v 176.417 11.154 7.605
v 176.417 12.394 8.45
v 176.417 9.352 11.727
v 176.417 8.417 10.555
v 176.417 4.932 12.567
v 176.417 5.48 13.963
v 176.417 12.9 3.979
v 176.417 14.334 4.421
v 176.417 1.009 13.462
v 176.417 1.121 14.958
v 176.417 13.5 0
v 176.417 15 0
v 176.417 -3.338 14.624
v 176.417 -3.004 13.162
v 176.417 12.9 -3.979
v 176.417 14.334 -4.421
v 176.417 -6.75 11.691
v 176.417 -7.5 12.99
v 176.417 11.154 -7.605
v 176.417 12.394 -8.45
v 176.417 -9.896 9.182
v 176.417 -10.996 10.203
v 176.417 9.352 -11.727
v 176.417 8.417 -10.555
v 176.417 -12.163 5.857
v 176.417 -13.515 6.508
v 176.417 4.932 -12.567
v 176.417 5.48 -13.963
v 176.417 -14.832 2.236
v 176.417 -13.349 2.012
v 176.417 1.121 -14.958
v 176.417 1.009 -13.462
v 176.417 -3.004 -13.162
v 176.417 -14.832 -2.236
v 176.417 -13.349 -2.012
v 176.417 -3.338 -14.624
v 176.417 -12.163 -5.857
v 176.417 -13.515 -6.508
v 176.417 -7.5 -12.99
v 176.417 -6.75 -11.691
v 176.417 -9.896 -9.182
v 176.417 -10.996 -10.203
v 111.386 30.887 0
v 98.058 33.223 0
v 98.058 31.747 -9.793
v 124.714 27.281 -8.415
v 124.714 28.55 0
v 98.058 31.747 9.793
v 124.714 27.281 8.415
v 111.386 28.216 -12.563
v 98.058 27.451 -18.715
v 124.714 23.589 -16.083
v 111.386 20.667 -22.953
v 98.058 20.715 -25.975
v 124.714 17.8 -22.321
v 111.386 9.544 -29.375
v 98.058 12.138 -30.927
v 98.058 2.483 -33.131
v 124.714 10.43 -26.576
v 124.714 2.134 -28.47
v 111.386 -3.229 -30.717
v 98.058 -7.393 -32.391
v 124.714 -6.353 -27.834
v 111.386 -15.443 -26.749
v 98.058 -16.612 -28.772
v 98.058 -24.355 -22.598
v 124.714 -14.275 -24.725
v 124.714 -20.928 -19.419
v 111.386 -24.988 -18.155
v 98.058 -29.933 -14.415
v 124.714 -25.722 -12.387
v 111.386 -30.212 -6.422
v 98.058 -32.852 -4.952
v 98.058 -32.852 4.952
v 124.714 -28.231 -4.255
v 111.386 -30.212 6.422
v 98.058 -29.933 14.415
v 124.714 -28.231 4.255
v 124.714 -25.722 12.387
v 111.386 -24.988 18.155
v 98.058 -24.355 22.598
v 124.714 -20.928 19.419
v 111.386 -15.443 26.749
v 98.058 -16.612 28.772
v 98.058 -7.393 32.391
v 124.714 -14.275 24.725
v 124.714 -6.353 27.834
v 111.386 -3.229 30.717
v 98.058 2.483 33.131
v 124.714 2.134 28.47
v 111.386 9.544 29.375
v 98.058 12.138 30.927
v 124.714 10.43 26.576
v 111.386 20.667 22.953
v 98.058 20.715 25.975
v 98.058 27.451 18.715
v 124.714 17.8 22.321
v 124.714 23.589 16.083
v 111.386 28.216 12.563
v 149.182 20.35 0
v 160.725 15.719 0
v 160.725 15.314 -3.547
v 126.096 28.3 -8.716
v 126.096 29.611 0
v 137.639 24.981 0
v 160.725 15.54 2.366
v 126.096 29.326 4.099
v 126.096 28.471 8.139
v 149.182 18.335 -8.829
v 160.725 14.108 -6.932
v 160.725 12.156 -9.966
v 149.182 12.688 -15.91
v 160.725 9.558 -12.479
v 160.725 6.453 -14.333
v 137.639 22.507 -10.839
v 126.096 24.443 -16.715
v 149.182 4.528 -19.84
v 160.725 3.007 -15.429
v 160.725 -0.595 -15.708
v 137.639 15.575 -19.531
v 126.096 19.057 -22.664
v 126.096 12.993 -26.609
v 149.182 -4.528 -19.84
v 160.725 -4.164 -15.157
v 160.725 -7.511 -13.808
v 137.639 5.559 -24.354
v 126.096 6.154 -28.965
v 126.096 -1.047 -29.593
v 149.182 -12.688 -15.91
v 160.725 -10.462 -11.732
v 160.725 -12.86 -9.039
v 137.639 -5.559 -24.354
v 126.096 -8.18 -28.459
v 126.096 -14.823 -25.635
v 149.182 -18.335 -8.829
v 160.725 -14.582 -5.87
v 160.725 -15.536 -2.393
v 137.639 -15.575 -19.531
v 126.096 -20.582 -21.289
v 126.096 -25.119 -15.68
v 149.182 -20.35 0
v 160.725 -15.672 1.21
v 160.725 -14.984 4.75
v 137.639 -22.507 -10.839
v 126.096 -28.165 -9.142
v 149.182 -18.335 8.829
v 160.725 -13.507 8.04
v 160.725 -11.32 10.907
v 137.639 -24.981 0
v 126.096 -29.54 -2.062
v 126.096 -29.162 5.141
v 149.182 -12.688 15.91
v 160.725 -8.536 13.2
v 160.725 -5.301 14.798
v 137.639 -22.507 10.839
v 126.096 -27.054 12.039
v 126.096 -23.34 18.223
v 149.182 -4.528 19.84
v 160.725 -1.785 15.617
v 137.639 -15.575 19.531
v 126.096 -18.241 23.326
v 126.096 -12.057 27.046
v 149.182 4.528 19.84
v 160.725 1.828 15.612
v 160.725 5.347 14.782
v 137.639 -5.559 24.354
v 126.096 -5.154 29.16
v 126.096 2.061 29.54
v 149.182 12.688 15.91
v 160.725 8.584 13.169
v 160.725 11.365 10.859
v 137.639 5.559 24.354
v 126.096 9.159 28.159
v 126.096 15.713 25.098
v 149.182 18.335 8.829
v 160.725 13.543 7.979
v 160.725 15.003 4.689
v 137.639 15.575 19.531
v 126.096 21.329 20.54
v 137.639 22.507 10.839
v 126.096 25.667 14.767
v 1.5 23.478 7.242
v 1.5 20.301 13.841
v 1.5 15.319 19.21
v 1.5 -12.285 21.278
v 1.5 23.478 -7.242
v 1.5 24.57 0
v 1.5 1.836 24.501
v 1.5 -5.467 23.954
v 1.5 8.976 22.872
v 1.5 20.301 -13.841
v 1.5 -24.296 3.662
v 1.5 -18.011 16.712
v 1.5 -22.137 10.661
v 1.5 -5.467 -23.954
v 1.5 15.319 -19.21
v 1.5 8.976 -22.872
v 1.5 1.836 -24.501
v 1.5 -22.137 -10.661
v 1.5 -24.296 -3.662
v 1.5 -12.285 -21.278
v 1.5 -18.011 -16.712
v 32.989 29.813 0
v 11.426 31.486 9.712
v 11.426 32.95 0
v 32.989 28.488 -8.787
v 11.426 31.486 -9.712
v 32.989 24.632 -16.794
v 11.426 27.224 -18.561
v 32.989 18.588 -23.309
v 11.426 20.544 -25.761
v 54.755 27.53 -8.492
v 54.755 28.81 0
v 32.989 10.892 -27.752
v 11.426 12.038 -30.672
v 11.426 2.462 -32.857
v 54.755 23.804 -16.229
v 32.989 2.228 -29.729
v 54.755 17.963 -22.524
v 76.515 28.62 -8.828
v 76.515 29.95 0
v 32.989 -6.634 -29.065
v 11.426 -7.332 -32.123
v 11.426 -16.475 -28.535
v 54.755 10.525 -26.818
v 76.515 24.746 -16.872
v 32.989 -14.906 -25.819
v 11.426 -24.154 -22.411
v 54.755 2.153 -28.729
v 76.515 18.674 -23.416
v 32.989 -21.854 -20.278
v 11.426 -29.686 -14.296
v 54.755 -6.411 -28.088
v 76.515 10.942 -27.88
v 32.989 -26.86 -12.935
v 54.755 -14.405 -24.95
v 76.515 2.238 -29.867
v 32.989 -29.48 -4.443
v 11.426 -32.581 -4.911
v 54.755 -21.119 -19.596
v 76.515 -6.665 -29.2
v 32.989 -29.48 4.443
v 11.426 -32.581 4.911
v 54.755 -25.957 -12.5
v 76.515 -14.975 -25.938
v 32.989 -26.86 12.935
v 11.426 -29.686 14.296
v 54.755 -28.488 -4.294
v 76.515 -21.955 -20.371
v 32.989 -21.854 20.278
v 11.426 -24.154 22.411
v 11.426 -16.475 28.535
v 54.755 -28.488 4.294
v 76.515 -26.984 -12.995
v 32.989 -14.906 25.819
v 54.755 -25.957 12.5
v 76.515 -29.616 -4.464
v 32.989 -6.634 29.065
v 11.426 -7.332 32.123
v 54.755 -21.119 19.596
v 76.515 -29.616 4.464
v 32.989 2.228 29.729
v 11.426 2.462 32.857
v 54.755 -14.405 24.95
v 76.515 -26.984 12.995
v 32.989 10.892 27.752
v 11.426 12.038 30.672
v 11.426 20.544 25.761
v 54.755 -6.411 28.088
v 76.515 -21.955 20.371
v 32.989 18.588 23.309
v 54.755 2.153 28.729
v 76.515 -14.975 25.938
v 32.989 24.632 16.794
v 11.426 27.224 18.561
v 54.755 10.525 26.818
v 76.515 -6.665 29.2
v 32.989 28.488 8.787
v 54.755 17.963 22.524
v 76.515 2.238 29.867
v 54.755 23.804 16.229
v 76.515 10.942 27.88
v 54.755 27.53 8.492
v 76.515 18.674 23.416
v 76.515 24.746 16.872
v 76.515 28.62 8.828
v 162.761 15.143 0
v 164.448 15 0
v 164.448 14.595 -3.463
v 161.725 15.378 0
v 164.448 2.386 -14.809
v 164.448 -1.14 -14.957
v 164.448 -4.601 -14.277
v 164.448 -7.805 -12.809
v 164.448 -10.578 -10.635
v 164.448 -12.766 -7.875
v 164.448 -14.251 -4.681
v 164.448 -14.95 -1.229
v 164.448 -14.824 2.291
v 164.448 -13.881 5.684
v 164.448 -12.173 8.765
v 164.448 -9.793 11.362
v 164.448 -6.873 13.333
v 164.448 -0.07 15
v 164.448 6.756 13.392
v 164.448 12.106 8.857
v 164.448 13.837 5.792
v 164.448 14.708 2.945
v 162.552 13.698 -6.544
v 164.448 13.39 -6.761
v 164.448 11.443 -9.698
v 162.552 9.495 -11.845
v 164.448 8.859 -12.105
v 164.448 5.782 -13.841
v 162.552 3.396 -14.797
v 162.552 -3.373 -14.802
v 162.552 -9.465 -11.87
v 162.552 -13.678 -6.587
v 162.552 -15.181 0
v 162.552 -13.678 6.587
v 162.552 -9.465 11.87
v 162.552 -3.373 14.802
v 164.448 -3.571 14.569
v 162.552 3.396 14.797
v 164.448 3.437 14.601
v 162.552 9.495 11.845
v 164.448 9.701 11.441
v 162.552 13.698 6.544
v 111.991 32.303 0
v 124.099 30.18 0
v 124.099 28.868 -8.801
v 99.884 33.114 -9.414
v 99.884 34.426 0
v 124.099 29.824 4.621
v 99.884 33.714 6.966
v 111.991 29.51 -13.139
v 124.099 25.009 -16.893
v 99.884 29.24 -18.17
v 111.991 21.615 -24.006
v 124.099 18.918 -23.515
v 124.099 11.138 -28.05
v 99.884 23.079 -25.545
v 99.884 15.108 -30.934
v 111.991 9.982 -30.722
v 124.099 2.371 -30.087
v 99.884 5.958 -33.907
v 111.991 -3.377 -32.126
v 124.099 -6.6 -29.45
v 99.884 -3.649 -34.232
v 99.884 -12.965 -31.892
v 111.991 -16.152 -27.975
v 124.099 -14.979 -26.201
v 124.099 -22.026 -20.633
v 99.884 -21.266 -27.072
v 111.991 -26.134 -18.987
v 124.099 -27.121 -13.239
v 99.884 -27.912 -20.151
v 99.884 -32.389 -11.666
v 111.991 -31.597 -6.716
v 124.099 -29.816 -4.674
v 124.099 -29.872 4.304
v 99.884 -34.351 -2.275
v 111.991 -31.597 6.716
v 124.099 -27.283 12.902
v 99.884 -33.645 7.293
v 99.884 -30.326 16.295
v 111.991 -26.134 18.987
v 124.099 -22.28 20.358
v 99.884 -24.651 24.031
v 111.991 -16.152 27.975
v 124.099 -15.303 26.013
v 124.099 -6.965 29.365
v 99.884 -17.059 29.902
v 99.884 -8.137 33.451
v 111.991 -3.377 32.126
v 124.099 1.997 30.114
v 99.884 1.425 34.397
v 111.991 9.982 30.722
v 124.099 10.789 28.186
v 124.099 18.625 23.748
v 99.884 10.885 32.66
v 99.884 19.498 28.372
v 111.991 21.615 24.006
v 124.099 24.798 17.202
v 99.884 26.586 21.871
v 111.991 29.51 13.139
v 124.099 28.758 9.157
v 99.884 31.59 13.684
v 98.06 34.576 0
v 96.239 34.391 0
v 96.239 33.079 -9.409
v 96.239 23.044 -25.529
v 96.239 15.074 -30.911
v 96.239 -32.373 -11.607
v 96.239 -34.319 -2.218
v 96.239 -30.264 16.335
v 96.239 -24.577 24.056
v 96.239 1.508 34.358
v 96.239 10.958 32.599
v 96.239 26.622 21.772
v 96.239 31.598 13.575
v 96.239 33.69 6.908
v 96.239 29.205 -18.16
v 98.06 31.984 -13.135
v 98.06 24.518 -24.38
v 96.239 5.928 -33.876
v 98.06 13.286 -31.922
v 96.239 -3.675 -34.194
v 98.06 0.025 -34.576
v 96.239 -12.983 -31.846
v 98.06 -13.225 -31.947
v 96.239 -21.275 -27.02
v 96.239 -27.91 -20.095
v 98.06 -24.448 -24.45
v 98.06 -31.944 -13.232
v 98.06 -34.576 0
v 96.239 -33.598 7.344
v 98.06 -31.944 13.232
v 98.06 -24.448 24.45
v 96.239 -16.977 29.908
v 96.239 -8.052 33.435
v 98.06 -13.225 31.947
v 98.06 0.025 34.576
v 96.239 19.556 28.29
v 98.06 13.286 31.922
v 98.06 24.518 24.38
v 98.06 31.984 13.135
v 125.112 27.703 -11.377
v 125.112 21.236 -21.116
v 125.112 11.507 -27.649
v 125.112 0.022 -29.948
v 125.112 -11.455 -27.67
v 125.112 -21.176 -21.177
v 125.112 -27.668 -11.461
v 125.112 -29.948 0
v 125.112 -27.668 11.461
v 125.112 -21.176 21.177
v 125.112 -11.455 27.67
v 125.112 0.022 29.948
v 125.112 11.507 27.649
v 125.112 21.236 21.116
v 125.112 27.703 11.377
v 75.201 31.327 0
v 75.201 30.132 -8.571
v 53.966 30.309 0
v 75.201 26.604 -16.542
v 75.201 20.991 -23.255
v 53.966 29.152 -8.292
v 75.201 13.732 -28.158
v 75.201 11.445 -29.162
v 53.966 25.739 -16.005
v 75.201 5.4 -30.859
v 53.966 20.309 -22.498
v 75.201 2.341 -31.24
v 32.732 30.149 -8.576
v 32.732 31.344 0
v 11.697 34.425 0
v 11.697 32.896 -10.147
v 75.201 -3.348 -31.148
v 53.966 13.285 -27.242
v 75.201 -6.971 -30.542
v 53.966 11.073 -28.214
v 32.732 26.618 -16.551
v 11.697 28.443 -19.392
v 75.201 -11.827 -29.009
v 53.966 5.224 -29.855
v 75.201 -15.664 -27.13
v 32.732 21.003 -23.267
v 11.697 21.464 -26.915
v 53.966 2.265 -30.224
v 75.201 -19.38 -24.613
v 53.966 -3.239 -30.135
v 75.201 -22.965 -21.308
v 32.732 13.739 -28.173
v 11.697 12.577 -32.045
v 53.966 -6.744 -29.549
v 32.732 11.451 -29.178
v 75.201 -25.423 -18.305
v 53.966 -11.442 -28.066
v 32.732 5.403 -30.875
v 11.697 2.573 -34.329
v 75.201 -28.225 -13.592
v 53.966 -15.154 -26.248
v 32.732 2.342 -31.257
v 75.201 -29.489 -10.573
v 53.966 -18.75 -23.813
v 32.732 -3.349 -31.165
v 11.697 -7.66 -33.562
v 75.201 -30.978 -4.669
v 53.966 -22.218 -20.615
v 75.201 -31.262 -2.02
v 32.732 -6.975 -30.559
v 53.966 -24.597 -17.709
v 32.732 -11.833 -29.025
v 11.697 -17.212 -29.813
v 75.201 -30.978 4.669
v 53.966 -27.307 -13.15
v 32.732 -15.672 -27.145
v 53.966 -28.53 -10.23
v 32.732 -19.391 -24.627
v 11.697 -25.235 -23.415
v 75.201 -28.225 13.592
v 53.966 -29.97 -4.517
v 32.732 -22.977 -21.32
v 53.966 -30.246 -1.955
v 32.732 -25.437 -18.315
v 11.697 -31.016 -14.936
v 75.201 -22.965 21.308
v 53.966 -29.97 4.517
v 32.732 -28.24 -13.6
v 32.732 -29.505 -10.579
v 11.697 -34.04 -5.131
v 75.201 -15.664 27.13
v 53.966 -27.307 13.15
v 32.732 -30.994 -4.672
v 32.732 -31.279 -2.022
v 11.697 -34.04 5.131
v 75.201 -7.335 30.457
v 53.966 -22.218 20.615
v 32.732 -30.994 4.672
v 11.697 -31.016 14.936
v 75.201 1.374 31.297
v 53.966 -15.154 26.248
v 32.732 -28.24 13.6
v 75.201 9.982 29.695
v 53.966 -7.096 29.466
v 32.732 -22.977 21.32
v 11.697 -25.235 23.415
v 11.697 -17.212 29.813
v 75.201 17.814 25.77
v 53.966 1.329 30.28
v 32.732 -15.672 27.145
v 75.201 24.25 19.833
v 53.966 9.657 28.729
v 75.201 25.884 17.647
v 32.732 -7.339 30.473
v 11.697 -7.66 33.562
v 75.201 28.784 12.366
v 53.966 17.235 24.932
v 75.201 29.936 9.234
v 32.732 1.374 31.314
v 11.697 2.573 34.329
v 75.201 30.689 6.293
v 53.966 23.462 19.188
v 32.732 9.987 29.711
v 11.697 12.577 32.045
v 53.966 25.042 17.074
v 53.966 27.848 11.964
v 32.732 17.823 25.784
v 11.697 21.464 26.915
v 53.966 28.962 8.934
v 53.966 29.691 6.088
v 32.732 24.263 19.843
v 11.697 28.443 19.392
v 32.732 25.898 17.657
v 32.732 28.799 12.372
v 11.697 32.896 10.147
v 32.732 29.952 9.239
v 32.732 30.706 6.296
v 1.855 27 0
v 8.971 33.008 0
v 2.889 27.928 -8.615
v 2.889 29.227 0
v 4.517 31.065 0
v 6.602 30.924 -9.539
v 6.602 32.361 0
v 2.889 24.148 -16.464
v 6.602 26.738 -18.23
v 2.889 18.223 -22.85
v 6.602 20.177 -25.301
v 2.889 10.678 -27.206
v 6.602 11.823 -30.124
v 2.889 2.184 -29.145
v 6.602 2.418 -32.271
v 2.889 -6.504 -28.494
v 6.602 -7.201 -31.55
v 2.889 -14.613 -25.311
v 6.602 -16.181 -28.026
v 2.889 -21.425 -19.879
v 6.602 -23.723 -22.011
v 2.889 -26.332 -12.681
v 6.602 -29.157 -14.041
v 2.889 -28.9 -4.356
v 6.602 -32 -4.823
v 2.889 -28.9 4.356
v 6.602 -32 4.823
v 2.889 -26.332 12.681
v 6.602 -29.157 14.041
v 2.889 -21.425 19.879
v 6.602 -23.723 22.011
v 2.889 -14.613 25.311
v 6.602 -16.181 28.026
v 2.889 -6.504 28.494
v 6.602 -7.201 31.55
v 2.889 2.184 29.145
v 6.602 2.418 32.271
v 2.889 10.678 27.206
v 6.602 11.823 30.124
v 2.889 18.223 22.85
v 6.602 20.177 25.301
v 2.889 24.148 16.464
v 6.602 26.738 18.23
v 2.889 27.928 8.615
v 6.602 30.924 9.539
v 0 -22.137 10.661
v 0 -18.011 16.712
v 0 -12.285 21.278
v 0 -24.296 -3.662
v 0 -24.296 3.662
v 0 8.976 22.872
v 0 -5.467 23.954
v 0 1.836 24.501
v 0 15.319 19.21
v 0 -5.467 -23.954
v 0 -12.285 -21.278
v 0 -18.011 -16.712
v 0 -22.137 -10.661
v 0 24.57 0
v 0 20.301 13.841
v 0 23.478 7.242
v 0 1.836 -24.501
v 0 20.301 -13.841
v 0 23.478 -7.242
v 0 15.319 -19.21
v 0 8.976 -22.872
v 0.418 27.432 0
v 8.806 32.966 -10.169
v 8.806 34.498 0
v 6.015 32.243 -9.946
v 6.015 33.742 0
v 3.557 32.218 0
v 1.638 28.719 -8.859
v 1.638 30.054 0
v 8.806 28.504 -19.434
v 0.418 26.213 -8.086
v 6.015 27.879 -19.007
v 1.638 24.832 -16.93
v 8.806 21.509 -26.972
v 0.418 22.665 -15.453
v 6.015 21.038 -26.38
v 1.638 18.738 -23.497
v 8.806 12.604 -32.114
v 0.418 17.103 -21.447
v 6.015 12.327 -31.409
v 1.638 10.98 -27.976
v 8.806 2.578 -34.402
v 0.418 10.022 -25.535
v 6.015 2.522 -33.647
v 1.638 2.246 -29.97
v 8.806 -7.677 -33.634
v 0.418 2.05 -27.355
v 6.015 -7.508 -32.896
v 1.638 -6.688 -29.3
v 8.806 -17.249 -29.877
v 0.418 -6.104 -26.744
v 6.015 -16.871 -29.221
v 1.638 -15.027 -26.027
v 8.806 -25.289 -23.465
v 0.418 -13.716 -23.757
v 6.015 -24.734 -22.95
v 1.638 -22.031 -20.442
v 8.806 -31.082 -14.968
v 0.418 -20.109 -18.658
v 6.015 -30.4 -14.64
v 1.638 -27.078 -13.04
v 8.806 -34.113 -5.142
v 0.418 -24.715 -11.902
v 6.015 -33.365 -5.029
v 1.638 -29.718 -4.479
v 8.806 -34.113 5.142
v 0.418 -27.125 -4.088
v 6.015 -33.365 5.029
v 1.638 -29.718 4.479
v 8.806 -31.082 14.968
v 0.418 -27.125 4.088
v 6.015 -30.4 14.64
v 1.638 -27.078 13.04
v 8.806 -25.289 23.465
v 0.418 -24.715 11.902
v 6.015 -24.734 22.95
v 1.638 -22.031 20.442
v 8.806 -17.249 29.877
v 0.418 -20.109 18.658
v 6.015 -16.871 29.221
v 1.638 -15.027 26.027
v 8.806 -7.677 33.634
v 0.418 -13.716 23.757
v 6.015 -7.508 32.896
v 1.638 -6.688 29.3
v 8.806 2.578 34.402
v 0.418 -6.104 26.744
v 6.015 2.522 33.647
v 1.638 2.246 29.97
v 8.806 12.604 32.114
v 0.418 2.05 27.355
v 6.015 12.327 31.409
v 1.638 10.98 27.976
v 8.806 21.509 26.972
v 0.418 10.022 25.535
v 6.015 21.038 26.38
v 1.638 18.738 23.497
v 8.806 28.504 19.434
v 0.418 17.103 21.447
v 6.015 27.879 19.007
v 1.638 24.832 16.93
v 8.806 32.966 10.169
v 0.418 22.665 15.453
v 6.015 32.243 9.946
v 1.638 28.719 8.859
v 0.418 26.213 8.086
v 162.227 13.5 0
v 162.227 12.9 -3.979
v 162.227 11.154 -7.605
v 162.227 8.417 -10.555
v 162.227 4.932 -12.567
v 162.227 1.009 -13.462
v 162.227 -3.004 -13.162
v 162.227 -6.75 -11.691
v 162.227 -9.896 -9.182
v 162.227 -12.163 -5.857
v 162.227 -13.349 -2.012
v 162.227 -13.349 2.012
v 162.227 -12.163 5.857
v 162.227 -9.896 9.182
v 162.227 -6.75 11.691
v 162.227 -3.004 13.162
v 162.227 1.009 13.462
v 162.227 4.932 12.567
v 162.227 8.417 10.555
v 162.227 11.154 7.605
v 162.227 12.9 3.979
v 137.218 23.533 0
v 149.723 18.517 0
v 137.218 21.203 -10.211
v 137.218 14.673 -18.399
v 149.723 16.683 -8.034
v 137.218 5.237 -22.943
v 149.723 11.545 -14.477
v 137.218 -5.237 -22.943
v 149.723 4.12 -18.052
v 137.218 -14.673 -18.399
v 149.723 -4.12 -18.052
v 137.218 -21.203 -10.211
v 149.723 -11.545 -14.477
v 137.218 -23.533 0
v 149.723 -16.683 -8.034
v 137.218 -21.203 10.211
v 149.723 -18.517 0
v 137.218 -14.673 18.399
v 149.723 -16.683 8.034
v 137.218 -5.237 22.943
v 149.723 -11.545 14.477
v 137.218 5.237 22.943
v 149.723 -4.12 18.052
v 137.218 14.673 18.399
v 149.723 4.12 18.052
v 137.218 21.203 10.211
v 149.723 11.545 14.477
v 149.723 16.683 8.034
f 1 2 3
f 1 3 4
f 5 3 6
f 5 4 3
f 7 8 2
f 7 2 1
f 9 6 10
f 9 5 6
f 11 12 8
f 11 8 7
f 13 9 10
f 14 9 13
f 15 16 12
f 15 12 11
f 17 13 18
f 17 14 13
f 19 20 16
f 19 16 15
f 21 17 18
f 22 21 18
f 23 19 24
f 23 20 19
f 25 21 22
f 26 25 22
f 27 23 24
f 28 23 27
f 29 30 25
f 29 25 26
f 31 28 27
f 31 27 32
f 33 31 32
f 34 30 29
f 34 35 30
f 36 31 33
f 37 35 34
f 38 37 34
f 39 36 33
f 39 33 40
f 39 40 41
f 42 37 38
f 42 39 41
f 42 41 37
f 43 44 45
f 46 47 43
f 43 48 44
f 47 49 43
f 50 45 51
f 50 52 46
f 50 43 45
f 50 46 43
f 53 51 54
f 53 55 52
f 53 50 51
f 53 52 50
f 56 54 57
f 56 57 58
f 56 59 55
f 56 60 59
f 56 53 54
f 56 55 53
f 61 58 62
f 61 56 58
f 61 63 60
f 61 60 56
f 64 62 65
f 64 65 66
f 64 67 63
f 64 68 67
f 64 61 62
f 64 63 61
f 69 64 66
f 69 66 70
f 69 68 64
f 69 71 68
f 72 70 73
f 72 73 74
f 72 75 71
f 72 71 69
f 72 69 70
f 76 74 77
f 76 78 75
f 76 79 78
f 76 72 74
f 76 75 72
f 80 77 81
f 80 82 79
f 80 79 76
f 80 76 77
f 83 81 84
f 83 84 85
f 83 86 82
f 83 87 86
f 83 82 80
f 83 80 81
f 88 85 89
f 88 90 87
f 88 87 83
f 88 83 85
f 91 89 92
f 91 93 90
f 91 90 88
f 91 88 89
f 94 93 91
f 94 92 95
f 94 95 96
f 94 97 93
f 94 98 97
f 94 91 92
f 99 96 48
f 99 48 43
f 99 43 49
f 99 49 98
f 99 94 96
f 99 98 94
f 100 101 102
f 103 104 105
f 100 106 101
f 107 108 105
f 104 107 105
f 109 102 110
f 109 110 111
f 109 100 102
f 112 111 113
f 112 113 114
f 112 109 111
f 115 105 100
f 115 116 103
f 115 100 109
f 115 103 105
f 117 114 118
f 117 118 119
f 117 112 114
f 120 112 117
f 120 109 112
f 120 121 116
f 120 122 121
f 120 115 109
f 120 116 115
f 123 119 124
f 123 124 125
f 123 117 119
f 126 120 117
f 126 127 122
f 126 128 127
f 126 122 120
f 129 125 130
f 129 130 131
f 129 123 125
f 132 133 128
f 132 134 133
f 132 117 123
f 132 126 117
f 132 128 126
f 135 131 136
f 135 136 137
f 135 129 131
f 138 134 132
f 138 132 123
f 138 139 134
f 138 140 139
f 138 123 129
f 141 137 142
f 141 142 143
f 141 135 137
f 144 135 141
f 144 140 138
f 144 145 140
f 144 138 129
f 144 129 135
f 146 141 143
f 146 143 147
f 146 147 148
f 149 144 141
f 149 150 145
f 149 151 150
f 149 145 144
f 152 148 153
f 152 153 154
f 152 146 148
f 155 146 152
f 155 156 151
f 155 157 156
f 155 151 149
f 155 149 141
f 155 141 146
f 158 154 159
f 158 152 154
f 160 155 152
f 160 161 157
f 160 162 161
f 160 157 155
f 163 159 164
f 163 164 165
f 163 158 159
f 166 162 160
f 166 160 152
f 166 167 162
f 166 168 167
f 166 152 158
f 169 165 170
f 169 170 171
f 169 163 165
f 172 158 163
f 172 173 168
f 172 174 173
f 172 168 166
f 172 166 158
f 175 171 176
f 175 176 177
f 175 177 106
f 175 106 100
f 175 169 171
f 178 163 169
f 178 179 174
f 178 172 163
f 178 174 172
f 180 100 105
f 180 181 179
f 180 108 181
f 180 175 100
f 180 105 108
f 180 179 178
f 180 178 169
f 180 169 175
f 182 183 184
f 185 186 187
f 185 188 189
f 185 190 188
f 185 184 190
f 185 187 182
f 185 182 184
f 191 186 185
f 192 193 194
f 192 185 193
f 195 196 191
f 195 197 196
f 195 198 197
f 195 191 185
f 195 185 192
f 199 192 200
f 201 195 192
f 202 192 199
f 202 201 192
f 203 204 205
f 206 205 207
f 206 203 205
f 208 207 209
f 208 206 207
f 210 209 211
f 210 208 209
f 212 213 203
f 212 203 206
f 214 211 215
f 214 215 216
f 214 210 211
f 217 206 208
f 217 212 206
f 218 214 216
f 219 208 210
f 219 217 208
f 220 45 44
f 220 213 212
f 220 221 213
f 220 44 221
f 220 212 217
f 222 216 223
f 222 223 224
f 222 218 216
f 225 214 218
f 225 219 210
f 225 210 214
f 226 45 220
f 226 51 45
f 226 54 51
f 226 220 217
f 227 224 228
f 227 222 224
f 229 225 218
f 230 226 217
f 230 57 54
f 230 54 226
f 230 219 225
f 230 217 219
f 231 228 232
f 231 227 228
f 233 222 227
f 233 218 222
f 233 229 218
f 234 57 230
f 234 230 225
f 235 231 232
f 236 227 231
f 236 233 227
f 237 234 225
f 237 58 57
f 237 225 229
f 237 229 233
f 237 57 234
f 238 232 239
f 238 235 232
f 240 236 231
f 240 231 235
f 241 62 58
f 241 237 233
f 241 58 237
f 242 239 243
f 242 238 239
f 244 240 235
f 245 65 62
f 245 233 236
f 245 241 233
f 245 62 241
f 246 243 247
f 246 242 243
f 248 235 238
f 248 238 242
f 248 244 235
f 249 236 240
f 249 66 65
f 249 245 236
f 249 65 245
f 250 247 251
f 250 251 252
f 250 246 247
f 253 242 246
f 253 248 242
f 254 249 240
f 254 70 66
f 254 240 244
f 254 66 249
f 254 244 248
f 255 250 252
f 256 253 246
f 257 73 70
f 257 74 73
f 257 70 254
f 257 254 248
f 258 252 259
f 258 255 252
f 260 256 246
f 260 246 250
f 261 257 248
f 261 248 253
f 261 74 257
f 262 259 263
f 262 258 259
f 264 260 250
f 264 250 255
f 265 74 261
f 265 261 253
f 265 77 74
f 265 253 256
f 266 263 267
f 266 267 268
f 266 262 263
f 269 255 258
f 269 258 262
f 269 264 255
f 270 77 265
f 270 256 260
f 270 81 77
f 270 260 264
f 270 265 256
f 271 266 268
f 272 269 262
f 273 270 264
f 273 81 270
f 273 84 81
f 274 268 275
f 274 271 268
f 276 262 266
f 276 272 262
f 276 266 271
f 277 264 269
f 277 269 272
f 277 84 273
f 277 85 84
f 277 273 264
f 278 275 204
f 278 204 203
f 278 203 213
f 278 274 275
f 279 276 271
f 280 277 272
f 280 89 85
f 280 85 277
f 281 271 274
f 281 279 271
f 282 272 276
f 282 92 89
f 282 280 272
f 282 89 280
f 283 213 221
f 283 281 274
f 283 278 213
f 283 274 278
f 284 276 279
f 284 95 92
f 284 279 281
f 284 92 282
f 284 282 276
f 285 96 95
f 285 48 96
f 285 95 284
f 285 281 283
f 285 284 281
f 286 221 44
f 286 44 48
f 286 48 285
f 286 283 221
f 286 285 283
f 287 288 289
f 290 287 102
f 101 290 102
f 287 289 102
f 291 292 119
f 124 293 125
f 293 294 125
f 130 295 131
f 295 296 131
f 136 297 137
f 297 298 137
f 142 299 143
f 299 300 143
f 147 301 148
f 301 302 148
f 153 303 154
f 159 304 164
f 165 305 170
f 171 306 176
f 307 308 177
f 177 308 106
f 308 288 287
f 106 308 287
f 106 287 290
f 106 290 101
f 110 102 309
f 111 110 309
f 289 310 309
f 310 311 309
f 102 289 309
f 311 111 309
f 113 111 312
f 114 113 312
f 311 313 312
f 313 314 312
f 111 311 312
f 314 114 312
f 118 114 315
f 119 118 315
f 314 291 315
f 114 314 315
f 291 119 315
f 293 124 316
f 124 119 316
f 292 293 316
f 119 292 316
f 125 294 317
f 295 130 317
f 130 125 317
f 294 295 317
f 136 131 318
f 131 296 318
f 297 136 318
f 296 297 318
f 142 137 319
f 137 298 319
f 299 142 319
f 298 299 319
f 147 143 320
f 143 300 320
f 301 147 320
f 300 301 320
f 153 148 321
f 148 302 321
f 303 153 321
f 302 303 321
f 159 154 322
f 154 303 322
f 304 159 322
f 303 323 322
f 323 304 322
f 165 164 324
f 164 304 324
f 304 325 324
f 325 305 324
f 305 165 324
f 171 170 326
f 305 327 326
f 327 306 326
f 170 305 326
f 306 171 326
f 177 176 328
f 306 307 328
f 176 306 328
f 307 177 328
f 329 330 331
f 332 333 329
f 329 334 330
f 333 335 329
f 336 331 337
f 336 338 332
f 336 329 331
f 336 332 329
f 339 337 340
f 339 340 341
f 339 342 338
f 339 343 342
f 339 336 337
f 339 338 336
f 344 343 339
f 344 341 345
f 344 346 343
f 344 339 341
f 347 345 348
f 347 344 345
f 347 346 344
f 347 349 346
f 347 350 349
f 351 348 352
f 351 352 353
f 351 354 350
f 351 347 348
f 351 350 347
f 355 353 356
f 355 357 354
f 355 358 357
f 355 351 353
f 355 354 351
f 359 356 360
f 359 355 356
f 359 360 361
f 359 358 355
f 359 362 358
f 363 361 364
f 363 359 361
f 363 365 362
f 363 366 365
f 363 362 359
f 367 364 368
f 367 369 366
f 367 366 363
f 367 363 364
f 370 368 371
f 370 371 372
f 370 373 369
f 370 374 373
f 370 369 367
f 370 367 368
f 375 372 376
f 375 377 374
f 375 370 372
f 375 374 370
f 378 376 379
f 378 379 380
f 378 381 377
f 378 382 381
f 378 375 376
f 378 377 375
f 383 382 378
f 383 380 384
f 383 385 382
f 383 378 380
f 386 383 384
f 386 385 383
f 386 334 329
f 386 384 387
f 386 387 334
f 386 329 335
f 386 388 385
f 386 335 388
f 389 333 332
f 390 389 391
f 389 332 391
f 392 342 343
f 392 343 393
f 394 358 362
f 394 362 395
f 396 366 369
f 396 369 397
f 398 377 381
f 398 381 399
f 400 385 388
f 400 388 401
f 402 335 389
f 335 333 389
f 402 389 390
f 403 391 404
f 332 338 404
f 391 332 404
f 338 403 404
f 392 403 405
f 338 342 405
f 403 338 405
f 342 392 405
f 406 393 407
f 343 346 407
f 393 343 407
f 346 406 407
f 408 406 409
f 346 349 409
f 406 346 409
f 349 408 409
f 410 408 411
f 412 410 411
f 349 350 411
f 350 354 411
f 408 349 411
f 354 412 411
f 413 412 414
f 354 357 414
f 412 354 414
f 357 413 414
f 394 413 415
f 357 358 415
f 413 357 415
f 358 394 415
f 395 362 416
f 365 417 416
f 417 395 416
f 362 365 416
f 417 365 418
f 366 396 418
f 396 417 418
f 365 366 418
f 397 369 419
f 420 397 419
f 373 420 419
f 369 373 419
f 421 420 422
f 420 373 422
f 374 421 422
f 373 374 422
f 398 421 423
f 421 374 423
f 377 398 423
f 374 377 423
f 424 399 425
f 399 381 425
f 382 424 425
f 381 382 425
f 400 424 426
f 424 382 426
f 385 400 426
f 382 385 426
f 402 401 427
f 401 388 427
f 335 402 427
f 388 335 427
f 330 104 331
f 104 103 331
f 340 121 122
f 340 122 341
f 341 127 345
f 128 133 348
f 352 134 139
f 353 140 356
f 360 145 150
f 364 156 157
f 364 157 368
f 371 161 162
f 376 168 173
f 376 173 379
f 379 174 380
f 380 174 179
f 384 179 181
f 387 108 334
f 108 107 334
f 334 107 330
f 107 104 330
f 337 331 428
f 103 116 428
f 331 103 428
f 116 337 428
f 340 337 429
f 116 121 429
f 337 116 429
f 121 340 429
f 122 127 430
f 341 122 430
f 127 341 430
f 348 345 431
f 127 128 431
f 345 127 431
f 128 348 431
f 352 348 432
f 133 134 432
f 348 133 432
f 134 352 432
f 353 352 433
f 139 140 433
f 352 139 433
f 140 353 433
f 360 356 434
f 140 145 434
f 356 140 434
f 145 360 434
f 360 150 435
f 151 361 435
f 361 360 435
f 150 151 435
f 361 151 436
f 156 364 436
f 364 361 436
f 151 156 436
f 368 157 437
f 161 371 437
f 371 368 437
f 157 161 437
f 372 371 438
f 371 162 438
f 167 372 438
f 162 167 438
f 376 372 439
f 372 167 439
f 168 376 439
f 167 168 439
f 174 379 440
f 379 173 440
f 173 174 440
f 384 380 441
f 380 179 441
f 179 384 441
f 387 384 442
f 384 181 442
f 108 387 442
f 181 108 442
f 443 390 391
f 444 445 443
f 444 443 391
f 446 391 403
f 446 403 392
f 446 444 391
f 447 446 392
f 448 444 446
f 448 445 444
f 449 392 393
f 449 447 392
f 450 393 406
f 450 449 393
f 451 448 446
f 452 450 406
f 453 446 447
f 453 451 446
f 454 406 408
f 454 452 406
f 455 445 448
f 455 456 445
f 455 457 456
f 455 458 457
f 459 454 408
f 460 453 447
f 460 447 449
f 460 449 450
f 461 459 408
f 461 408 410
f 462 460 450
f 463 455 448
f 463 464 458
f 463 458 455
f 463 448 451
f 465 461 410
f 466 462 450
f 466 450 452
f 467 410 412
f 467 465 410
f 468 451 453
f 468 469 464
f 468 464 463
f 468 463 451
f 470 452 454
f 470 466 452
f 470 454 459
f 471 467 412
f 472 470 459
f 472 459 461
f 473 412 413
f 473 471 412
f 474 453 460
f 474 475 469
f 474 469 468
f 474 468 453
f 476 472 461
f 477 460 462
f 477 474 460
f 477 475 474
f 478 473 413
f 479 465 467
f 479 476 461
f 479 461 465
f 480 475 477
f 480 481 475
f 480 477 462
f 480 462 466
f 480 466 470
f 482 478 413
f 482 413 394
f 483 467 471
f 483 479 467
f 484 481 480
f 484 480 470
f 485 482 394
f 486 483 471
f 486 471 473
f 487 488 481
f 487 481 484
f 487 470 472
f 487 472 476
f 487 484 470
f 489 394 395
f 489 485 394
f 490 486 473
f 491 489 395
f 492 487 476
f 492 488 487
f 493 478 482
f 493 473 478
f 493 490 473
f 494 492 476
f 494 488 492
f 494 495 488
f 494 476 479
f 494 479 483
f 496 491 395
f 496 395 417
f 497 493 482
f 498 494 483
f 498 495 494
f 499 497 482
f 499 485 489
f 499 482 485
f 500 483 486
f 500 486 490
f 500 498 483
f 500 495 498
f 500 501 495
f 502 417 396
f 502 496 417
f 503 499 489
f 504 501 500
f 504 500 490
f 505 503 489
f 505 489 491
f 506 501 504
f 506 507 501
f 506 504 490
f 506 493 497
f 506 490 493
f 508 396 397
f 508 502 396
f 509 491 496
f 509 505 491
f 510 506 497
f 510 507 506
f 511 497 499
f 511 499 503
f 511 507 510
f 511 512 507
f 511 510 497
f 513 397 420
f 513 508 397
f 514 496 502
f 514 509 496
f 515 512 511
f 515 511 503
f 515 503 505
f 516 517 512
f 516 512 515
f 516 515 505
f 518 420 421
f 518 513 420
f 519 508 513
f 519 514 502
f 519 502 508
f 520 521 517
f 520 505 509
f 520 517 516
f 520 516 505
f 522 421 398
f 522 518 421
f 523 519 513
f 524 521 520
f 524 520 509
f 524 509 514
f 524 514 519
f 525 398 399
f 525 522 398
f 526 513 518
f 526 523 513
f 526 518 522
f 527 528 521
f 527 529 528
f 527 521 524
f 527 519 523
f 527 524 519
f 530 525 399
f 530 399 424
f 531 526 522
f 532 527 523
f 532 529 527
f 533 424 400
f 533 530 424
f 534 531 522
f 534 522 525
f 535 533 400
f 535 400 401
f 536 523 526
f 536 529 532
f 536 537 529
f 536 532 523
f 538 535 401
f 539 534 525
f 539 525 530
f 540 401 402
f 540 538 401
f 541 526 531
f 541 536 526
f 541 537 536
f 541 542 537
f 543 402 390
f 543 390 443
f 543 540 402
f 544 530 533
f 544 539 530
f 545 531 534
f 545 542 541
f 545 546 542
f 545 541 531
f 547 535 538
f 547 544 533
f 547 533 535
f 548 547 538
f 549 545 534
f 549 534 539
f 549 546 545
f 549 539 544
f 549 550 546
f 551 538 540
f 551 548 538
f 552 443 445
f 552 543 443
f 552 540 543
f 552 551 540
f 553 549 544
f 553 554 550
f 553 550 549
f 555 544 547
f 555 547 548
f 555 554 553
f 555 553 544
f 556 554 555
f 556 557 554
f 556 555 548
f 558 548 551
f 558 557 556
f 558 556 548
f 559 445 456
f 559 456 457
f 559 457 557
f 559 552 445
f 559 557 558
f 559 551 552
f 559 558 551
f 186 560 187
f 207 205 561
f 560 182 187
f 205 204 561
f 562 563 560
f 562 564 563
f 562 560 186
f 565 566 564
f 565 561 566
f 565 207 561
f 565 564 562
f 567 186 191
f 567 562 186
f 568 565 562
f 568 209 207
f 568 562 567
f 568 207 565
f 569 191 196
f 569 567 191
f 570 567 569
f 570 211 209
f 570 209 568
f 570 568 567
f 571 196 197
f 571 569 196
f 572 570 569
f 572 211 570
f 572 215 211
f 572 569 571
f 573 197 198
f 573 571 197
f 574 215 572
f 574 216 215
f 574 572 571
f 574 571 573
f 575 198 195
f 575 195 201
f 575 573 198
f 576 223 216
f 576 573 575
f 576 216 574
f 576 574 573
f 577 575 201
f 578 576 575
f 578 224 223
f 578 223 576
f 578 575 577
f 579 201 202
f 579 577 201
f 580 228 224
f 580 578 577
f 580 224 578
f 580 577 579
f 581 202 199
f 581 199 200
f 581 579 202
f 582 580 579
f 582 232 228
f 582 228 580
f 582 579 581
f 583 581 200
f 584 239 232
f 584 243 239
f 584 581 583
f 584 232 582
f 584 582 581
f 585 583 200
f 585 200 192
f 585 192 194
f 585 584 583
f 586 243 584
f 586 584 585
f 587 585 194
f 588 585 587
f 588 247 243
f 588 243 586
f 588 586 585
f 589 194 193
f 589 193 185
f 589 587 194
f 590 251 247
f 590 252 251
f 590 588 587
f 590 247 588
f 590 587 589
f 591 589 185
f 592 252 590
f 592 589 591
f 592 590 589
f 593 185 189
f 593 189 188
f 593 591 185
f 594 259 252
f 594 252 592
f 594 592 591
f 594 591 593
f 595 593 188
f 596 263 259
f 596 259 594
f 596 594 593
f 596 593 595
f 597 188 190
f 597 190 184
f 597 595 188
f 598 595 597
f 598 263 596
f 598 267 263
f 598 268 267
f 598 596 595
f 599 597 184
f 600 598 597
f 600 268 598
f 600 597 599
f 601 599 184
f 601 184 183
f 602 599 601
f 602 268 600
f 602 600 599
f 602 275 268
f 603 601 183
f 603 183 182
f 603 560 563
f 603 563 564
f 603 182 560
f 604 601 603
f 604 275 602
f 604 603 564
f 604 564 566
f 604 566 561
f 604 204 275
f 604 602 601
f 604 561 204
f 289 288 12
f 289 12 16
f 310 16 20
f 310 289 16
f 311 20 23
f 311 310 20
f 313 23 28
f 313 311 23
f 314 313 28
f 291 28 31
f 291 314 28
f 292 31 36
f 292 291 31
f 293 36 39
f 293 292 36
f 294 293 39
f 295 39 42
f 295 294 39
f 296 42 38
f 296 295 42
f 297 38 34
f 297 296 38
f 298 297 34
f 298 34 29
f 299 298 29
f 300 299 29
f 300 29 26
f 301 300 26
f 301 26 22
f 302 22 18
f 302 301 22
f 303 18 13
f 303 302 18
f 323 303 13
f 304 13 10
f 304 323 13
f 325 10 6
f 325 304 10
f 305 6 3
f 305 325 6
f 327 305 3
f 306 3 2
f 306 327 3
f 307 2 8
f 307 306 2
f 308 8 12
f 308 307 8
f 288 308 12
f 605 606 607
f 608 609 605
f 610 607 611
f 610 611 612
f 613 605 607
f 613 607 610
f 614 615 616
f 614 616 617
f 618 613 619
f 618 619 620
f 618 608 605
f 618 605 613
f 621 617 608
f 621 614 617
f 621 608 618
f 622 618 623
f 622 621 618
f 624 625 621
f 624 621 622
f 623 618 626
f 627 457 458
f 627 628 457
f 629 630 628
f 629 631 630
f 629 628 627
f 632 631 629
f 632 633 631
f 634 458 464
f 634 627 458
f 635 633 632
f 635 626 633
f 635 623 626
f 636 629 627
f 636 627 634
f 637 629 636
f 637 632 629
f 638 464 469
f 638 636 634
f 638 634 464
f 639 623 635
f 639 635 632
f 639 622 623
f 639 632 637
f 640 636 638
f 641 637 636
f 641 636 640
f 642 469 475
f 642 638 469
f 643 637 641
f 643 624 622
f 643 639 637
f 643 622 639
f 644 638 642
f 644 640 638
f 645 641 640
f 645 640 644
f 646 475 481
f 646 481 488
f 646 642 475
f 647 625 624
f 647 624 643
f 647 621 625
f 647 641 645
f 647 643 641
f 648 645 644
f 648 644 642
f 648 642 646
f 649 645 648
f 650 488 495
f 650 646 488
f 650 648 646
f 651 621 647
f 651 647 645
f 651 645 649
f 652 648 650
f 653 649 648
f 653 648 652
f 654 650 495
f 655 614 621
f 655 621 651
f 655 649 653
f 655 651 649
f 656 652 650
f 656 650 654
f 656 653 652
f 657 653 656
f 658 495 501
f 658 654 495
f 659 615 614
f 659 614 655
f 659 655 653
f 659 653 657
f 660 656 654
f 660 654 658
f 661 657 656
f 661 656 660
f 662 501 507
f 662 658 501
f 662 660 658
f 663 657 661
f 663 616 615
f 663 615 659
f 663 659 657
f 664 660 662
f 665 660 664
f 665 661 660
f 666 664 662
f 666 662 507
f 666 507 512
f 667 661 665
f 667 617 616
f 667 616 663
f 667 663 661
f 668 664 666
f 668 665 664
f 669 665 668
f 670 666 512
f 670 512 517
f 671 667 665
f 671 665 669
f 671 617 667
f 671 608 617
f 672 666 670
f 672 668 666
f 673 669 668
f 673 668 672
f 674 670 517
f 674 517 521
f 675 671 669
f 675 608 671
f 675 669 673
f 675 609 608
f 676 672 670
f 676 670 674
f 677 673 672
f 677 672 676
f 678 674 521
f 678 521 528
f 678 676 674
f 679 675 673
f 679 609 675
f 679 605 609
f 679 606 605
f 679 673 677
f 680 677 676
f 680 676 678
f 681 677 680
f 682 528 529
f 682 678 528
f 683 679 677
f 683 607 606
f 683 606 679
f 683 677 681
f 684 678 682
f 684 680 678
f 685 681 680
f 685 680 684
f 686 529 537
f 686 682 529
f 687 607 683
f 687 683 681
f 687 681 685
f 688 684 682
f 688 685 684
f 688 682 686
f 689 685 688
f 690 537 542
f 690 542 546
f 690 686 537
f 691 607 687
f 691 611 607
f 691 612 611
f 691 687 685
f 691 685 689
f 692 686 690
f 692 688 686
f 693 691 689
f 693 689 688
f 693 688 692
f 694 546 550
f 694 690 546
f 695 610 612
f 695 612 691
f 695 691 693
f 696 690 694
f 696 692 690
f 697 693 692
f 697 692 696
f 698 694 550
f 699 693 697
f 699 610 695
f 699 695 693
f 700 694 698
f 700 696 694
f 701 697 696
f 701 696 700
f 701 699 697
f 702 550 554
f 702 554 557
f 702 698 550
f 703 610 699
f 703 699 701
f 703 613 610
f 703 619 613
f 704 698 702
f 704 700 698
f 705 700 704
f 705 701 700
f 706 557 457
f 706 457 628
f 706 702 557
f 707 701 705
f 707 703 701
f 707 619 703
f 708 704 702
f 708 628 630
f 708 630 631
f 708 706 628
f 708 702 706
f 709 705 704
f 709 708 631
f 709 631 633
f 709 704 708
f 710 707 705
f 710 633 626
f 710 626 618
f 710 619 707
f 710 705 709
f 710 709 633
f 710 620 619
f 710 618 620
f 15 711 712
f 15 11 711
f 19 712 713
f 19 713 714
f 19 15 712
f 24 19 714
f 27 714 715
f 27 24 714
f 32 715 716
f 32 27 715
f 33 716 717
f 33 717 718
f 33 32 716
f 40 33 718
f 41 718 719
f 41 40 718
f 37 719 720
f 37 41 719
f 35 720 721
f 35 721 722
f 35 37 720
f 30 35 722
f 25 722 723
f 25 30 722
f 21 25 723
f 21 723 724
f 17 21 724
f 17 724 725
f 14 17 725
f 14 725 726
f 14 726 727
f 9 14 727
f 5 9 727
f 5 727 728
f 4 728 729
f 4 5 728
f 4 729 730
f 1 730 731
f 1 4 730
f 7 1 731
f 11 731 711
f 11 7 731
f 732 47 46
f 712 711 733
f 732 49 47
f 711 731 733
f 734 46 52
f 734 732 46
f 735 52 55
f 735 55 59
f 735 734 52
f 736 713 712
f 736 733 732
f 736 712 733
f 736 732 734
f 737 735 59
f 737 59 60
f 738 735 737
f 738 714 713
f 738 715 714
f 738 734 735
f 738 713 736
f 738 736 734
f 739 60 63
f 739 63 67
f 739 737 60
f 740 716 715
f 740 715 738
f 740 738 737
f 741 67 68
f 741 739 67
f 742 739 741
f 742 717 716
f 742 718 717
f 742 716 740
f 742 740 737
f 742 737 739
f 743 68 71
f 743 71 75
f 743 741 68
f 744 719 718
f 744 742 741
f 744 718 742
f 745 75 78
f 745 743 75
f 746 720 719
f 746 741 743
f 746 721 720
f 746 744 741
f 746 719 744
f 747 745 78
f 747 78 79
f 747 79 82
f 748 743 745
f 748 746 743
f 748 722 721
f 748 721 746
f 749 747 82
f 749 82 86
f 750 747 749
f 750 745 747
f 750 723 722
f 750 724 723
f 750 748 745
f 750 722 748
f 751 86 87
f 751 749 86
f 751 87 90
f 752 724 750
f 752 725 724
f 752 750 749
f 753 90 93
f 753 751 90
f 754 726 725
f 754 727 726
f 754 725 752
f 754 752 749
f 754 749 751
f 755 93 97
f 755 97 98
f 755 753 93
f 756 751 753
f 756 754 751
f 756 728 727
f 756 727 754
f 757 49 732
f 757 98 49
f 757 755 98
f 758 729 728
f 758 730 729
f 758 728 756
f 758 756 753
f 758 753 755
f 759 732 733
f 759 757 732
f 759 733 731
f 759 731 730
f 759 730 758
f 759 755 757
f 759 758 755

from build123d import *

# Parameters (mm, degrees)
FILLET1_R = 10


with BuildPart() as part:
    # Sketch1 → Revolve1 (revolve)
    with BuildSketch(Plane.XY):
        with BuildLine():
            ThreePointArc((1.5, 24.57), (4.516916983, 31.065059709), (11.426070736, 32.949518021))
            ThreePointArc((11.426070736, 32.949518021), (54.755418646, 28.809847984), (98.05771623, 33.223495257))
            Line((98.05771623, 33.223495257), (124.713836064, 28.549572437))
            Line((124.713836064, 28.549572437), (162.227403624, 13.5))
            Line((162.227403624, 13.5), (174.917066057, 13.5))
            Line((174.917066057, 13.5), (176.417066057, 13.5))
            Line((176.417066057, 13.5), (176.417066057, 15))
            Line((176.417066057, 15), (162.517066057, 15))
            Line((162.517066057, 15), (125.127066057, 30))
            Line((125.127066057, 30), (98.037066057, 34.75))
            ThreePointArc((98.037066057, 34.75), (54.883168803, 30.3102994), (11.697066057, 34.424946311))
            ThreePointArc((11.697066057, 34.424946311), (3.556812147, 32.217570221), (0, 24.57))
            Line((0, 24.57), (0, 0))
            Line((0, 0), (1.5, 0))
            Line((1.5, 0), (1.5, 24.57))
        make_face()
    revolve(axis=Axis((174.917066057, 0, 0), (-1, 0, 0)))

    # Fillet1
    fillet1_edges = [part.edges().sort_by_distance(p)[0] for p in [
        (98.037066057, -34.75, 0),
        (125.127066057, -30, 0),
        (162.517066057, -15, 0),
    ]]
    fillet(fillet1_edges, radius=FILLET1_R)


solid = part.part
